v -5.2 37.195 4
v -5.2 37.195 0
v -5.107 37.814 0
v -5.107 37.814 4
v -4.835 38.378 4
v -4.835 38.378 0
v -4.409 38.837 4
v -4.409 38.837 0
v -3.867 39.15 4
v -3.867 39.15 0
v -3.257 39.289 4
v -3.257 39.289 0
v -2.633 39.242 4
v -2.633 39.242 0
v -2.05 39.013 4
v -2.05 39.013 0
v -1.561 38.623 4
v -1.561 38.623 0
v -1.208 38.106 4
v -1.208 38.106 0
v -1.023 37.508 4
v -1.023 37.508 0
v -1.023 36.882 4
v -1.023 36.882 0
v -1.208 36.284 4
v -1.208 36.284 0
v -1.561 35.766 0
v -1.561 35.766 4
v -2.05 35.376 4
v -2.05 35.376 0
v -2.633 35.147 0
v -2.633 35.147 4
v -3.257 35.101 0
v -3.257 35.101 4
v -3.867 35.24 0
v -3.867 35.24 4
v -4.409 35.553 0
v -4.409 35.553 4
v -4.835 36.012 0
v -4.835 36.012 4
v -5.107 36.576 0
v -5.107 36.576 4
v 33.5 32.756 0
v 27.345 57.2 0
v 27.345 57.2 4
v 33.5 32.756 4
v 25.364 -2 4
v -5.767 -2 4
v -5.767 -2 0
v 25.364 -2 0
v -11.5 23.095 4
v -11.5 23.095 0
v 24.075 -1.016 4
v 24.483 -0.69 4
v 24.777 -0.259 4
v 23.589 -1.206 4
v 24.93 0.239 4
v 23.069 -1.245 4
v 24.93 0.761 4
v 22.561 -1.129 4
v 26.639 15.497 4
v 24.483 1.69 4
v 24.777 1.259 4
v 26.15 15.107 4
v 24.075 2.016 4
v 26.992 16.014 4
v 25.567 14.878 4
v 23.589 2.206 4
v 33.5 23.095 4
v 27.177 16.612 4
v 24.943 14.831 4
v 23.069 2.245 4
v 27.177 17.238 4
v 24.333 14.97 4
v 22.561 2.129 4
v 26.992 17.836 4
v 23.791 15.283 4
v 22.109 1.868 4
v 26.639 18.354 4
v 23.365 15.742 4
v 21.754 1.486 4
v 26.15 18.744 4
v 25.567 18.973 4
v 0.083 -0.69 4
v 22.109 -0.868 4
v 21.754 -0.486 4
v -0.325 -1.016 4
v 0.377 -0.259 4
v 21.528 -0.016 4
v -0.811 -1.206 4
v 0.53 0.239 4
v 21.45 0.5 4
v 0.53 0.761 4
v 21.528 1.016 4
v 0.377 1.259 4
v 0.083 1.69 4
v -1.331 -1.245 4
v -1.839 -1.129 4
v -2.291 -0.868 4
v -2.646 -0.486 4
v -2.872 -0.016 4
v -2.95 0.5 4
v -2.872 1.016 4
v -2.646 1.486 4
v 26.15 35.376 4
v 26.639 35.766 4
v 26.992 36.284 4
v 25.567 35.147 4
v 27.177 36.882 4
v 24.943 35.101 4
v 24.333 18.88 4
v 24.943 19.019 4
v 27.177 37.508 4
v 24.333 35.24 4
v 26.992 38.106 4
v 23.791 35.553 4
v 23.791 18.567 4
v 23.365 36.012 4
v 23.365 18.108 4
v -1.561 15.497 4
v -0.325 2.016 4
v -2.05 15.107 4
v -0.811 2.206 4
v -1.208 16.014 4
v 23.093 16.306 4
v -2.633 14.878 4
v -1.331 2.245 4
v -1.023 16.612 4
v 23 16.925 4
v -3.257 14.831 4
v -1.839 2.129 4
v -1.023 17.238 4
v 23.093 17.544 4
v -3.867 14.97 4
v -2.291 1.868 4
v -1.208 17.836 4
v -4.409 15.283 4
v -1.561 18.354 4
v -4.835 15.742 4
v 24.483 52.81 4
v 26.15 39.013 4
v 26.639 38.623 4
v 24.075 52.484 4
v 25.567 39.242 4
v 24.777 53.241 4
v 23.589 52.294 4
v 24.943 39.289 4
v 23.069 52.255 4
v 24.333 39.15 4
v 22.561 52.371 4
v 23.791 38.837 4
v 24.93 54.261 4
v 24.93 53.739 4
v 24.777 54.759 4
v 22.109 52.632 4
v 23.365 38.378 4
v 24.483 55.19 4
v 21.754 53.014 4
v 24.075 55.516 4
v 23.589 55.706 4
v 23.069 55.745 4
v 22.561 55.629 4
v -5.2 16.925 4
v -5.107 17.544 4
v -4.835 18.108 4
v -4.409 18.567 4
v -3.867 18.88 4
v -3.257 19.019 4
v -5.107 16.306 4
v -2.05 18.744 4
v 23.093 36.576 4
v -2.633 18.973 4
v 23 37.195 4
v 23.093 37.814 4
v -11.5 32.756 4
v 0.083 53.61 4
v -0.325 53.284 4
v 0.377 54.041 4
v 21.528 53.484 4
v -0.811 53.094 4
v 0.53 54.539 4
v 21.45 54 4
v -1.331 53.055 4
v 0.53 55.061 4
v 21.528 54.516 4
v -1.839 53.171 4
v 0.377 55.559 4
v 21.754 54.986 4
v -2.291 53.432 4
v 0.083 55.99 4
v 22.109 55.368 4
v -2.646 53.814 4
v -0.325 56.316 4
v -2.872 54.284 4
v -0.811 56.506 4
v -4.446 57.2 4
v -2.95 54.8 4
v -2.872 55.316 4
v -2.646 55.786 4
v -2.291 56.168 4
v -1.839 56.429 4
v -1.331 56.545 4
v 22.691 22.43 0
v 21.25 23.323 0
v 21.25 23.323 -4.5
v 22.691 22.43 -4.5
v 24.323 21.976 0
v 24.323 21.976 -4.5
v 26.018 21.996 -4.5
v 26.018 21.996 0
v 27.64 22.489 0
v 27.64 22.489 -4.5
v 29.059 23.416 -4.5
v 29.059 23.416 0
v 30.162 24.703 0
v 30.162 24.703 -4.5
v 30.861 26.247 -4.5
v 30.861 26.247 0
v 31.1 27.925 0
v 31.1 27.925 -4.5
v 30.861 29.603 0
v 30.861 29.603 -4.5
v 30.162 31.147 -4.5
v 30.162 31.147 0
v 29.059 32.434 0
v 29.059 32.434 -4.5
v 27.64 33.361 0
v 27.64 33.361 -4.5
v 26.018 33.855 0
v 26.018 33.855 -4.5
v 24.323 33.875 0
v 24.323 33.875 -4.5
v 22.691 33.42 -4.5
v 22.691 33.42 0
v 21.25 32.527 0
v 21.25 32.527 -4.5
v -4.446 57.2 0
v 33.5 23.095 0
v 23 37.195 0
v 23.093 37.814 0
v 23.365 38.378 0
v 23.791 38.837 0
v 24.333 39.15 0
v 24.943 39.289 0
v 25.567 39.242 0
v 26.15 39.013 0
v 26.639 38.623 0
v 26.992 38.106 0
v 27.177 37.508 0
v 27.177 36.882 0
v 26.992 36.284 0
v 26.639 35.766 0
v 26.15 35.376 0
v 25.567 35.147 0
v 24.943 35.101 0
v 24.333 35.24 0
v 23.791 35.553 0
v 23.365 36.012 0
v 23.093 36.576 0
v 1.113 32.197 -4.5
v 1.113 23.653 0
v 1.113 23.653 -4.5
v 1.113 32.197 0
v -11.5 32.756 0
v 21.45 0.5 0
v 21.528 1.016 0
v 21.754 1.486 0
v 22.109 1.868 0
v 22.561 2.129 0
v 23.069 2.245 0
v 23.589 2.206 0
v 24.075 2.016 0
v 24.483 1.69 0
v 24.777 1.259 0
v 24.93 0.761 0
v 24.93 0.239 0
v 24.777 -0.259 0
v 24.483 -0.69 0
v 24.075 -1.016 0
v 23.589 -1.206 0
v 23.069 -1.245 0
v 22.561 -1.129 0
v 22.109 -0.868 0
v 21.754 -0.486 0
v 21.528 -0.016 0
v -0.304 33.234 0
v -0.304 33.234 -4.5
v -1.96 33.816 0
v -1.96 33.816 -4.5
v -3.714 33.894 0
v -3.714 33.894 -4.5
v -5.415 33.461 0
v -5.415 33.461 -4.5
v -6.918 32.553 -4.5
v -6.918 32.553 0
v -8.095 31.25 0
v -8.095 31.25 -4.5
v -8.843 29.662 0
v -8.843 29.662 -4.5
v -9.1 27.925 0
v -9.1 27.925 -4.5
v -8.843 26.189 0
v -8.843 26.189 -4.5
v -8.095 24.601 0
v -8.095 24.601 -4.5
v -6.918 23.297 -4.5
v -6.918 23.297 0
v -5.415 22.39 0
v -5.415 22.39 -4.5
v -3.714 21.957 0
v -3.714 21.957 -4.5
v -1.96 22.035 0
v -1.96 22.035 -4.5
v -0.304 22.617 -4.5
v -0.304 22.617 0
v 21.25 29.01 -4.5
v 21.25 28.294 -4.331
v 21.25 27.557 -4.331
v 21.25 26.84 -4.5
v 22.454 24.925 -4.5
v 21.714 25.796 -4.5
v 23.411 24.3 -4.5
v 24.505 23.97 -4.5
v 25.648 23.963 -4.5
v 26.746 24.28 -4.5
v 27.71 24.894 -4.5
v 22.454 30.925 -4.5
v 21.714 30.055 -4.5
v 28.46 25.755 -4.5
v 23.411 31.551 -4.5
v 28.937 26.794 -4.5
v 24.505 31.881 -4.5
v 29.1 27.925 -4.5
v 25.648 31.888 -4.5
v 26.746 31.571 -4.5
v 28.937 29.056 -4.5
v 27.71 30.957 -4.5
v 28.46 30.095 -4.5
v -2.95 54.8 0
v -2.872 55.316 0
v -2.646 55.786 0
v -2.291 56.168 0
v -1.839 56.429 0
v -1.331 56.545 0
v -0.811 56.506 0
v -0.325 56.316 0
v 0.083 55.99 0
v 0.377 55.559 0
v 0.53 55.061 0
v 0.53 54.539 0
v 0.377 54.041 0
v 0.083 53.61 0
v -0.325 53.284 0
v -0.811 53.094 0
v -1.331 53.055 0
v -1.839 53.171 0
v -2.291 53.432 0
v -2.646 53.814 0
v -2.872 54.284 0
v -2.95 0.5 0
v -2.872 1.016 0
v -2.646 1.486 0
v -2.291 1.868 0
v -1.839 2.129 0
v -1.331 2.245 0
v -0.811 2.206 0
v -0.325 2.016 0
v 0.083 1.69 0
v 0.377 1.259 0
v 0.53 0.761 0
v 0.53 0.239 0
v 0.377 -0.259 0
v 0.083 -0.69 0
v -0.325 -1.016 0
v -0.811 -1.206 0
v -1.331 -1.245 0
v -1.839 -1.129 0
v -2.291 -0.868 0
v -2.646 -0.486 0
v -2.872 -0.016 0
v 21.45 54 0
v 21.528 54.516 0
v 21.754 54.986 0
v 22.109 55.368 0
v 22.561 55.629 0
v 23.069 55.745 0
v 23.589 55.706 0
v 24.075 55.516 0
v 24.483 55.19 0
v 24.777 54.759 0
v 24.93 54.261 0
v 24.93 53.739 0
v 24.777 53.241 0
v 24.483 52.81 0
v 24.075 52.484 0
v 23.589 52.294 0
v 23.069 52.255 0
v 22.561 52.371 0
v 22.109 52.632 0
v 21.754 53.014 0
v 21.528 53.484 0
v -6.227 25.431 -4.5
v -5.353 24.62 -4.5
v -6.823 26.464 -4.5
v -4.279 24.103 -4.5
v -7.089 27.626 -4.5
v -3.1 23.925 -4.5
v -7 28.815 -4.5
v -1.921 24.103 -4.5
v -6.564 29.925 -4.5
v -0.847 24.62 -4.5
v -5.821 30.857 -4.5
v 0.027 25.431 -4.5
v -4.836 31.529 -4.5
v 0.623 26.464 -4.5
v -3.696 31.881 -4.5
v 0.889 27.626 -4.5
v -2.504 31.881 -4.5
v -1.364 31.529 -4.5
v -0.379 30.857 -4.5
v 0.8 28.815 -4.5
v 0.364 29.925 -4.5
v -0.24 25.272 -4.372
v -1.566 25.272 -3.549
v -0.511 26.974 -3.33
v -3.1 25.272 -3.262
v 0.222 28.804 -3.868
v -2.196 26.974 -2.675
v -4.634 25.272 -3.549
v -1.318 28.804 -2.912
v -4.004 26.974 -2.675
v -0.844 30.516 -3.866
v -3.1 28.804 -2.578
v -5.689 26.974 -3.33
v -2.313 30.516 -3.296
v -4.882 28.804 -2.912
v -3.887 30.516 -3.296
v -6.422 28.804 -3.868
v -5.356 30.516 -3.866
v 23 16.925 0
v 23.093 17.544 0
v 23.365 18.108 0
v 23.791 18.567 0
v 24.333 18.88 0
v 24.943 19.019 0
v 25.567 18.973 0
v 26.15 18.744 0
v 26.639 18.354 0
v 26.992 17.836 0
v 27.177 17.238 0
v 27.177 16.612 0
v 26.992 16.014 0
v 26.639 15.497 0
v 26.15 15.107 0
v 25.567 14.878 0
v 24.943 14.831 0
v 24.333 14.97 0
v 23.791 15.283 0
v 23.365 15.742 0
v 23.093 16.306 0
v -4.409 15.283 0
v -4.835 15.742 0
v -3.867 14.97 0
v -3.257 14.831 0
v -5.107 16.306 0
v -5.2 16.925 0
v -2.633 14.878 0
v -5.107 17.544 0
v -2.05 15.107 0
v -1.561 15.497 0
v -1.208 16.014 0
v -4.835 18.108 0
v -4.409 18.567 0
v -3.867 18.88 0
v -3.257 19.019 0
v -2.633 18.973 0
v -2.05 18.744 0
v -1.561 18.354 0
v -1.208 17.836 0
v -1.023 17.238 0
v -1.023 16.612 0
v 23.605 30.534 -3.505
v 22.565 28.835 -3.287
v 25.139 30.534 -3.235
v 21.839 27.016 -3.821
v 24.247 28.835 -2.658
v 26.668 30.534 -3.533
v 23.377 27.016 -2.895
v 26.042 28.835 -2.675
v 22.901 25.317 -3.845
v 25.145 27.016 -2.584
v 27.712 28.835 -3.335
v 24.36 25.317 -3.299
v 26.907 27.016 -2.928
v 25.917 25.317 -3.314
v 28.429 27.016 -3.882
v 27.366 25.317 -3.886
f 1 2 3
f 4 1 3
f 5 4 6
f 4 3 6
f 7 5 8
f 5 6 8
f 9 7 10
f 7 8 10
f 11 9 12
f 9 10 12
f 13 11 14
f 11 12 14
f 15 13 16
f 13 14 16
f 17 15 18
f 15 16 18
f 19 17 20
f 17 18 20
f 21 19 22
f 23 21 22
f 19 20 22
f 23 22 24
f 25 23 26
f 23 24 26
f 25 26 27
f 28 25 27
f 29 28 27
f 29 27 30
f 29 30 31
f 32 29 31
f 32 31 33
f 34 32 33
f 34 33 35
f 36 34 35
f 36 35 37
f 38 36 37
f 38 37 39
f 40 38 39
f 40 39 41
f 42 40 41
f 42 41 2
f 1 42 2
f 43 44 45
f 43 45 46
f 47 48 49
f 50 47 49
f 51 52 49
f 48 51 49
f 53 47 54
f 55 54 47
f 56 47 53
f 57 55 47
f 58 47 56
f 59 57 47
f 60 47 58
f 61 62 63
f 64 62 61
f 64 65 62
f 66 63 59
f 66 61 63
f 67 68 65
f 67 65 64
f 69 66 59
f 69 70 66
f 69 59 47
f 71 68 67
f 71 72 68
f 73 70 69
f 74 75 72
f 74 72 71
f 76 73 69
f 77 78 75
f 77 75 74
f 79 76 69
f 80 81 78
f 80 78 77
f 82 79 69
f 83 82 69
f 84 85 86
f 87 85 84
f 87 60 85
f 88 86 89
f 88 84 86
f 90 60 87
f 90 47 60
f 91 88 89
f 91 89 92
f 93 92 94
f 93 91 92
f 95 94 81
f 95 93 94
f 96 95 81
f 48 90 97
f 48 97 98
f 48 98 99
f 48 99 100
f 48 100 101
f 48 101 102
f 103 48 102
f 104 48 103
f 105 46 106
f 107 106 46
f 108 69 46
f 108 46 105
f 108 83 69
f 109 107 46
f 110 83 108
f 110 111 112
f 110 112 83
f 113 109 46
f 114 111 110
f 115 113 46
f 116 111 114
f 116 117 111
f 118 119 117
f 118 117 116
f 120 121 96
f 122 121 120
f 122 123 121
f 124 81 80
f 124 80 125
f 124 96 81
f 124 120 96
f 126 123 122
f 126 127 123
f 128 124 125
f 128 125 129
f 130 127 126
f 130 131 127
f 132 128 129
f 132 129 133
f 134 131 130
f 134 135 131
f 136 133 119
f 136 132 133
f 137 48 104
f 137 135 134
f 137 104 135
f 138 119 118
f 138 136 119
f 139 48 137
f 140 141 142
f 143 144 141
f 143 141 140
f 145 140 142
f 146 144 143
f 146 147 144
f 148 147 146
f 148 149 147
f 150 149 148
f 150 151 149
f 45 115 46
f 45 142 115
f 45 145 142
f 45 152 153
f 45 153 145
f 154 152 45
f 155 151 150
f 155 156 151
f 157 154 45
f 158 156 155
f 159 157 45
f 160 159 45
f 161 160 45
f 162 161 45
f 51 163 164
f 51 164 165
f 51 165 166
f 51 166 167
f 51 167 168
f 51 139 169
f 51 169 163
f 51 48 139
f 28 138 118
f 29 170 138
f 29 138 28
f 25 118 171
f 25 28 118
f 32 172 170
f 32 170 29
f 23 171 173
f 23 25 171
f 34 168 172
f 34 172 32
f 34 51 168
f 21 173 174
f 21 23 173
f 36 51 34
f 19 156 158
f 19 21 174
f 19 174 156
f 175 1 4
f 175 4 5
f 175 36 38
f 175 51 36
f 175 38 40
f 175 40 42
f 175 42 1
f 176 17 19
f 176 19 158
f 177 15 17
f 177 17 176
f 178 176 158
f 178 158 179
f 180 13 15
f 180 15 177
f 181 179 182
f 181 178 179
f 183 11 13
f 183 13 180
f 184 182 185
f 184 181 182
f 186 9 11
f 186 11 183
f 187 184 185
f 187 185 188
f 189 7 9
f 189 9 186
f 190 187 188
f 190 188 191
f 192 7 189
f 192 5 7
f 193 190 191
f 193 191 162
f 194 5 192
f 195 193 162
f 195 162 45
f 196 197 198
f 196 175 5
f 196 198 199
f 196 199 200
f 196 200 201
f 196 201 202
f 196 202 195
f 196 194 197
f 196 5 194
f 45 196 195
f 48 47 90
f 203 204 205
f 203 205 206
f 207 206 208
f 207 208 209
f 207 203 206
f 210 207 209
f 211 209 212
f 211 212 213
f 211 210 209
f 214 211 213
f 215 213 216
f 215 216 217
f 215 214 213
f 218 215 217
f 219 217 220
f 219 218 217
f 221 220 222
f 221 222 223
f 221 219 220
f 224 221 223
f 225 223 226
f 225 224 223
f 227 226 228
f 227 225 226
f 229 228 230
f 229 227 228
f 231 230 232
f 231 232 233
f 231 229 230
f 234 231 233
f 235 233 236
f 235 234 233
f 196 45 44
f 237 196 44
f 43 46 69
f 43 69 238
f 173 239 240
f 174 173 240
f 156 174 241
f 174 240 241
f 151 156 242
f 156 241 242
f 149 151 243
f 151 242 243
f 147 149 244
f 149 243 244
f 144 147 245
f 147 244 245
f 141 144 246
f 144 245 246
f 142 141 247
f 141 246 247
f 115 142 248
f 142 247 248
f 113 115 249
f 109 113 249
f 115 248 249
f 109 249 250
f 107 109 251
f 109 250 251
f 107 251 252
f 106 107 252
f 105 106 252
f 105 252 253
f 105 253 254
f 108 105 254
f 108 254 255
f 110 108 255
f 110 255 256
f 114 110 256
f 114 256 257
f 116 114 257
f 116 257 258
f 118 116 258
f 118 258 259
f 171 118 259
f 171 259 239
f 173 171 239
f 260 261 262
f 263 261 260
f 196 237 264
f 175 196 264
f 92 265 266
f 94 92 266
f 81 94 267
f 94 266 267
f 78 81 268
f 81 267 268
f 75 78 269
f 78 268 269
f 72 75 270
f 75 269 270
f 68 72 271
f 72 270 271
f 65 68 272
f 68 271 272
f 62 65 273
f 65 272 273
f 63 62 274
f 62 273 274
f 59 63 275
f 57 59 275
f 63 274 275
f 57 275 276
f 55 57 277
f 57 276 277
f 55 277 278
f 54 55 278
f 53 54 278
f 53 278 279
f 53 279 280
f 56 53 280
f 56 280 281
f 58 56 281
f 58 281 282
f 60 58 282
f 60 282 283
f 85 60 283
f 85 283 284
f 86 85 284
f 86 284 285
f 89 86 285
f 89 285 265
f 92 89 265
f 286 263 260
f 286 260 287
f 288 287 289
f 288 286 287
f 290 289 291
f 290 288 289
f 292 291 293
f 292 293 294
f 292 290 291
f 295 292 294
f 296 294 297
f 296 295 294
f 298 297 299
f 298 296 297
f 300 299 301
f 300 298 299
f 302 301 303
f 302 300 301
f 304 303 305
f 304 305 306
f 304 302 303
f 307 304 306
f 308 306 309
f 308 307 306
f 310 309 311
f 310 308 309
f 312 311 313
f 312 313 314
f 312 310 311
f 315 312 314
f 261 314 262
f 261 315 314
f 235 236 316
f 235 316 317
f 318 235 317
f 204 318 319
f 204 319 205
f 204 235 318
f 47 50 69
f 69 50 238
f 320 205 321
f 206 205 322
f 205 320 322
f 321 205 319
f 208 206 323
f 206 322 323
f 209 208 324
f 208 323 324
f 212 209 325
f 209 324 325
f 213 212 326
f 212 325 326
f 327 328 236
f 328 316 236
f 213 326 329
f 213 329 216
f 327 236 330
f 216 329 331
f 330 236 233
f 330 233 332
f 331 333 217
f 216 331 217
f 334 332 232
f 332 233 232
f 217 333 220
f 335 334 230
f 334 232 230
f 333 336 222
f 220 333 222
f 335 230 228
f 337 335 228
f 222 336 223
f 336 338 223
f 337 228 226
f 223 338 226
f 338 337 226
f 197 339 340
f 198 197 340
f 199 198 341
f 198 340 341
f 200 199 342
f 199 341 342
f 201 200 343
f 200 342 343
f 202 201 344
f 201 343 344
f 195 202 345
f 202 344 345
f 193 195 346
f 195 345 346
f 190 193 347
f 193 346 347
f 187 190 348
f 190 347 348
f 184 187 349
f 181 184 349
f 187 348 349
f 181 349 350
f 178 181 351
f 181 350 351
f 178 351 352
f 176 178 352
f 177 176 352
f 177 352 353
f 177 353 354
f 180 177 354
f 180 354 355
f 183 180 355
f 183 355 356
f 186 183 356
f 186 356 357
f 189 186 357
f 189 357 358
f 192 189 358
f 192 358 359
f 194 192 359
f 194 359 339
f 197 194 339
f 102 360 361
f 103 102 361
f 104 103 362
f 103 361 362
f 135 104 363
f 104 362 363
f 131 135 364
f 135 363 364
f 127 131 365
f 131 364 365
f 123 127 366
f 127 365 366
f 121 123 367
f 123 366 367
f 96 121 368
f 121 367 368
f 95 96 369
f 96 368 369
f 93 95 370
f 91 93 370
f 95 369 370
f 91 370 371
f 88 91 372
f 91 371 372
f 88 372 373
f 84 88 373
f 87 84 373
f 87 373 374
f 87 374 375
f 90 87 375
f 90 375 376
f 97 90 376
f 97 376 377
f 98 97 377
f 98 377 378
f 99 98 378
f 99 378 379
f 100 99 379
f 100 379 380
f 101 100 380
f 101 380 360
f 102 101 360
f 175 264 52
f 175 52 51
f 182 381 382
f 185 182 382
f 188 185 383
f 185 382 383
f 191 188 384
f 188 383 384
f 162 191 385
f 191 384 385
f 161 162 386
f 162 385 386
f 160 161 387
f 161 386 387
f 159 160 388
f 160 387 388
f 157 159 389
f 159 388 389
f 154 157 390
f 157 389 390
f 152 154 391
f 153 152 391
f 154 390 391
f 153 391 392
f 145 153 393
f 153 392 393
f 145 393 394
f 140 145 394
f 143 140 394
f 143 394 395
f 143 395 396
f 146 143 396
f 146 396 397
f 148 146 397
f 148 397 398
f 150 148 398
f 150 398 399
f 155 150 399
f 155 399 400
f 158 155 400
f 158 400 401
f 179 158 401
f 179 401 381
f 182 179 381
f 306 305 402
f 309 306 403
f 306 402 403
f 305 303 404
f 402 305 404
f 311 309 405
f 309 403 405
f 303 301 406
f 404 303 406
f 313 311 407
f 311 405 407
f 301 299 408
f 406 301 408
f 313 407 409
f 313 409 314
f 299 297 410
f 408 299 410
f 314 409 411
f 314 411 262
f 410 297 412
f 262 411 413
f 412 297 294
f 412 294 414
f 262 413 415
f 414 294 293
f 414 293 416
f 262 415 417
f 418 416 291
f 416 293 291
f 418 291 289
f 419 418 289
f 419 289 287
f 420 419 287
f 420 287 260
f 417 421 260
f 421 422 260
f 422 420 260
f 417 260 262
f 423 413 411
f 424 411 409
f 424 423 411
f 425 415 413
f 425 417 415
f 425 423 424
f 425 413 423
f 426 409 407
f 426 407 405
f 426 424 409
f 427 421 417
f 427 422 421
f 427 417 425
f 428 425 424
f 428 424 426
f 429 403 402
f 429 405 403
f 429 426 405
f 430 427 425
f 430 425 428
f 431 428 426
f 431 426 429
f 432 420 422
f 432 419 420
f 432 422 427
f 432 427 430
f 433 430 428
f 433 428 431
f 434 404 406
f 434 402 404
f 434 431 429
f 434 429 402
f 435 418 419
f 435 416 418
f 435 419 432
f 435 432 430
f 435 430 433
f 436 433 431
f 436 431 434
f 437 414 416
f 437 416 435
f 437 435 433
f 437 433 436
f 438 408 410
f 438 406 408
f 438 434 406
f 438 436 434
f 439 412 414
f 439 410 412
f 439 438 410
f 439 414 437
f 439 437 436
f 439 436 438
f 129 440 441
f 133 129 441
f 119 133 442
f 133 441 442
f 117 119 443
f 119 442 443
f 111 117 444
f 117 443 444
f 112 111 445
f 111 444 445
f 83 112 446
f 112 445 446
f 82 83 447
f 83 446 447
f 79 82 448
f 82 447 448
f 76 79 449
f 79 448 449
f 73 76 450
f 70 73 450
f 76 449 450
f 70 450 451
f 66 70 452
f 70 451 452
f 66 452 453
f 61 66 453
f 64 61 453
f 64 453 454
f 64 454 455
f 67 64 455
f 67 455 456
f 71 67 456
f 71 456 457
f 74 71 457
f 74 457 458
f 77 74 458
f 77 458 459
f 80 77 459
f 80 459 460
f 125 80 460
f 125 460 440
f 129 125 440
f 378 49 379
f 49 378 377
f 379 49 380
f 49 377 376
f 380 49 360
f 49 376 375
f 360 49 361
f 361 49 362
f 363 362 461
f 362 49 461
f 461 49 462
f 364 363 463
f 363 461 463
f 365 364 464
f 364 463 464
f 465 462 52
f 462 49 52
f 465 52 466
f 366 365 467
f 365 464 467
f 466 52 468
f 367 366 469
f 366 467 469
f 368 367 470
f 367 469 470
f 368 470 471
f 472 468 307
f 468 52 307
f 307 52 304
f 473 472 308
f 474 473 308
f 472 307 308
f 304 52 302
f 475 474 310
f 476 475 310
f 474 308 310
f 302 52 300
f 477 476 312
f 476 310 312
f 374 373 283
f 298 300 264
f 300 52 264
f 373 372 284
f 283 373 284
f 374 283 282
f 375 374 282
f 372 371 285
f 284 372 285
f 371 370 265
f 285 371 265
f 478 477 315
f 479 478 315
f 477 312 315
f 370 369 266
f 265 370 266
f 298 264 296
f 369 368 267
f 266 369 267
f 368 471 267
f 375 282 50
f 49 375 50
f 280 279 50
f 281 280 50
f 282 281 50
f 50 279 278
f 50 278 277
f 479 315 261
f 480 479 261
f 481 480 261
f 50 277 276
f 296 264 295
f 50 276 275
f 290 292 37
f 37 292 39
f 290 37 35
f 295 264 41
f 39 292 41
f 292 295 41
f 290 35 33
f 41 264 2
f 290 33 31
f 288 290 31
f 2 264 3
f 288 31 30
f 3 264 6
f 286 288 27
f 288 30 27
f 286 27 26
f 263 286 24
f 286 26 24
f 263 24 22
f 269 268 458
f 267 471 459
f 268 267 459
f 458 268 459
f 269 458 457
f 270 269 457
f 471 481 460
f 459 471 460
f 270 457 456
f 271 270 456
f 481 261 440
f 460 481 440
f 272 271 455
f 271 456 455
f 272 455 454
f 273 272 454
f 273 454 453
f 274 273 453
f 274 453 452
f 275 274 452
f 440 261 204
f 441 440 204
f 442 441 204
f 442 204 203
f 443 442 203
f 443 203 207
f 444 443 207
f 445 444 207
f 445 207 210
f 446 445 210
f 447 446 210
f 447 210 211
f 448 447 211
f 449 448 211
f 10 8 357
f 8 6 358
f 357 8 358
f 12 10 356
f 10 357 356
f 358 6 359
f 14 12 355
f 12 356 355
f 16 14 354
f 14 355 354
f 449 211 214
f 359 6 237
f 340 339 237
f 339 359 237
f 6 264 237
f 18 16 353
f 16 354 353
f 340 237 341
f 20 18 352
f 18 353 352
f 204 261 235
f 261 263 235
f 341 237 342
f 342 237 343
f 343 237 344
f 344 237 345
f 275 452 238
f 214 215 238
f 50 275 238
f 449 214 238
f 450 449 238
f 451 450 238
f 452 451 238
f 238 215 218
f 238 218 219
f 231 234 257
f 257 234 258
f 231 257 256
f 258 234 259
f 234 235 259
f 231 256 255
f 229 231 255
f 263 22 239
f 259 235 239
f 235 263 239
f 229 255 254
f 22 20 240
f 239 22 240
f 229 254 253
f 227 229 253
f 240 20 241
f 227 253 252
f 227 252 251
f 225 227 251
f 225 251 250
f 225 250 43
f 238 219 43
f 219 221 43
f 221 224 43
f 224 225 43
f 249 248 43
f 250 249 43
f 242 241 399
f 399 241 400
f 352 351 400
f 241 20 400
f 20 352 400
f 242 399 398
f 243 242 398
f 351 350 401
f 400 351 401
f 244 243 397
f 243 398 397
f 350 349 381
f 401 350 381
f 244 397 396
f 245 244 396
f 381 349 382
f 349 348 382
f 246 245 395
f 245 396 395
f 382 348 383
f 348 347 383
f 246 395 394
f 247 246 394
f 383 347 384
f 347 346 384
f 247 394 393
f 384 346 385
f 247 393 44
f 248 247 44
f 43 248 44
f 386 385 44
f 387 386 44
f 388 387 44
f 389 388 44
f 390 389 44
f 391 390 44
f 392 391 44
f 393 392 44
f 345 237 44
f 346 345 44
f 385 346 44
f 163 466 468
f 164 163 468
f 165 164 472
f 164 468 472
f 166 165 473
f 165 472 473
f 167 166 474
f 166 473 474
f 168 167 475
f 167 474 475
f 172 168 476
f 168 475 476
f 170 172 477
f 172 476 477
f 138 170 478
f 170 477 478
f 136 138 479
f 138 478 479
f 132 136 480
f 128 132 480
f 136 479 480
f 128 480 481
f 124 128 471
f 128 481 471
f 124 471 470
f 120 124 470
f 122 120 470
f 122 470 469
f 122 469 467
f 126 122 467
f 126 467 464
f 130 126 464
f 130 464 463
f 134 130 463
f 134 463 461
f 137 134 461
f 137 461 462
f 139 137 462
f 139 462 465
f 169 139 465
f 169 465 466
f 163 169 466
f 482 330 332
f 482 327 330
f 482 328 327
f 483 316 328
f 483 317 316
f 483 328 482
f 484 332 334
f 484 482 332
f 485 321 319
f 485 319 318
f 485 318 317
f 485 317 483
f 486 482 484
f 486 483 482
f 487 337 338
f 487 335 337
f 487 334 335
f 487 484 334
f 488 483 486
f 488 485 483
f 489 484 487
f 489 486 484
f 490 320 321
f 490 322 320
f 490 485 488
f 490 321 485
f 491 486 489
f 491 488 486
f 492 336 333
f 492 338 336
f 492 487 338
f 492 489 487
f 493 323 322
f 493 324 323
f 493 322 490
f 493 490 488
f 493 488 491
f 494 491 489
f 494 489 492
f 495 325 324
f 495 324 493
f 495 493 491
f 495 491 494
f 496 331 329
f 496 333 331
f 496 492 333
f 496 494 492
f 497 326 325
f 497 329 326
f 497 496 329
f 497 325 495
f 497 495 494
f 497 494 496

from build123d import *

# Parameters (mm, degrees)
CROQUIS1_W               = 22
CROQUIS1_H               = 55.2
SALIENTE_EXTRUIR1_DEPTH  = 4
CROQUIS2_W               = 12.1
CROQUIS2_H               = 4
CORTAR_EXTRUIR1_DEPTH    = 9.6
CROQUIS3_W               = 12.1
CROQUIS3_H               = 4
CORTAR_EXTRUIR2_DEPTH    = 9.6
CORTAR_EXTRUIR3_DEPTH    = 16
CORTAR_EXTRUIR4_START    = -16
CORTAR_EXTRUIR4_DEPTH    = 16
CROQUIS9_W               = 11.778481694
CROQUIS9_H               = 4
CORTAR_EXTRUIR5_DEPTH    = 2
CROQUIS11_W              = 4.95
CROQUIS11_H              = 4
SALIENTE_EXTRUIR3_DEPTH  = 2
CROQUIS12_W              = 4
CROQUIS12_H              = 1.8
SALIENTE_EXTRUIR4_DEPTH  = 12.1
CROQUIS13_W              = 4.95
CROQUIS13_H              = 4
SALIENTE_EXTRUIR5_DEPTH  = 2
CROQUIS14_W              = 4
CROQUIS14_H              = 1.8
SALIENTE_EXTRUIR6_DEPTH  = 12.1
CROQUIS17_W              = 4
CROQUIS17_H              = 59.2
SALIENTE_EXTRUIR8_DEPTH  = 11.5
CROQUIS18_W              = 4
CROQUIS18_H              = 59.2
SALIENTE_EXTRUIR9_DEPTH  = 11.5
CROQUIS19_R              = 1.75
CORTAR_EXTRUIR6_DEPTH    = 11.5
CORTAR_EXTRUIR7_DEPTH    = 10
CROQUIS27_W              = 12.1
CROQUIS27_H              = 55.6
CORTAR_EXTRUIR8_DEPTH    = 10
CROQUIS28_W              = 12.1
CROQUIS28_H              = 4
SALIENTE_EXTRUIR10_DEPTH = 55.6
SALIENTE_EXTRUIR11_DEPTH = 4.5
CROQUIS30_R              = 2.1
CORTAR_EXTRUIR9_DEPTH    = 10


with BuildPart() as part:
    # Croquis1 → Saliente-Extruir1 (new body)
    with BuildSketch(Plane.XY):
        with Locations((11, 27.6)):
            Rectangle(CROQUIS1_W, CROQUIS1_H)
    extrude(amount=SALIENTE_EXTRUIR1_DEPTH)

    # Croquis2 → Cortar-Extruir1 (cut)
    with BuildSketch(Plane(origin=(0, 55.2, 0), x_dir=(1, 0, 0), z_dir=(0, 1, 0))):
        with Locations((11, -2)):
            Rectangle(CROQUIS2_W, CROQUIS2_H)
    extrude(amount=-CORTAR_EXTRUIR1_DEPTH, mode=Mode.SUBTRACT)

    # Croquis3 → Cortar-Extruir2 (cut)
    with BuildSketch(Plane.XZ):
        with Locations((11, 2)):
            Rectangle(CROQUIS3_W, CROQUIS3_H)
    extrude(amount=-CORTAR_EXTRUIR2_DEPTH, mode=Mode.SUBTRACT)

    # Croquis5 → Cortar-Extruir3 (cut)
    with BuildSketch(Plane.XZ.offset(-9.6)):
        with BuildLine():
            Line((7.4, 4), (14.6, 4))
            ThreePointArc((14.6, 4), (16.401151853, 1.506649462), (17.05, -1.5))
            Line((17.05, -1.5), (4.95, -1.5))
            ThreePointArc((4.95, -1.5), (5.598848147, 1.506649462), (7.4, 4))
        make_face()
    extrude(amount=-CORTAR_EXTRUIR3_DEPTH, mode=Mode.SUBTRACT)

    # Croquis7 → Cortar-Extruir4 (cut)
    with BuildSketch(Plane(origin=(0, 45.6, 0), x_dir=(1, 0, 0), z_dir=(0, 1, 0)).offset(CORTAR_EXTRUIR4_START)):
        with BuildLine():
            Line((4.95, 1.5), (17.05, 1.5))
            ThreePointArc((17.05, 1.5), (16.401151853, -1.506649462), (14.6, -4))
            Line((14.6, -4), (7.4, -4))
            ThreePointArc((7.4, -4), (5.598848147, -1.506649462), (4.95, 1.5))
        make_face()
    extrude(amount=CORTAR_EXTRUIR4_DEPTH, mode=Mode.SUBTRACT)

    # Croquis9 → Cortar-Extruir5 (cut)
    with BuildSketch(Plane(origin=(0, 0, 0), x_dir=(-1, 0, 0), z_dir=(0, 0, -1))):
        with Locations((-11, 27.6)):
            Rectangle(CROQUIS9_W, CROQUIS9_H)
    extrude(amount=-CORTAR_EXTRUIR5_DEPTH, mode=Mode.SUBTRACT)

    # Croquis11 → Saliente-Extruir3 (add)
    with BuildSketch(Plane(origin=(0, 55.2, 0), x_dir=(1, 0, 0), z_dir=(0, 1, 0))):
        with Locations((2.475, -2)):
            Rectangle(CROQUIS11_W, CROQUIS11_H)
        with Locations((19.525, -2)):
            Rectangle(CROQUIS11_W, CROQUIS11_H)
    extrude(amount=SALIENTE_EXTRUIR3_DEPTH)

    # Croquis12 → Saliente-Extruir4 (add)
    with BuildSketch(Plane(origin=(4.95, 0, 0), x_dir=(0, 0, -1), z_dir=(1, 0, 0))):
        with Locations((-2, 56.3)):
            Rectangle(CROQUIS12_W, CROQUIS12_H)
    extrude(amount=SALIENTE_EXTRUIR4_DEPTH)

    # Croquis13 → Saliente-Extruir5 (add)
    with BuildSketch(Plane.XZ):
        with Locations((19.525, 2)):
            Rectangle(CROQUIS13_W, CROQUIS13_H)
        with Locations((2.475, 2)):
            Rectangle(CROQUIS13_W, CROQUIS13_H)
    extrude(amount=SALIENTE_EXTRUIR5_DEPTH)

    # Croquis14 → Saliente-Extruir6 (add)
    with BuildSketch(Plane(origin=(4.95, 0, 0), x_dir=(0, 0, -1), z_dir=(1, 0, 0))):
        with Locations((-2, -1.1)):
            Rectangle(CROQUIS14_W, CROQUIS14_H)
    extrude(amount=SALIENTE_EXTRUIR6_DEPTH)

    # Croquis17 → Saliente-Extruir8 (add)
    with BuildSketch(Plane.ZY):
        with Locations((2, 27.6)):
            Rectangle(CROQUIS17_W, CROQUIS17_H)
    extrude(amount=SALIENTE_EXTRUIR8_DEPTH)

    # Croquis18 → Saliente-Extruir9 (add)
    with BuildSketch(Plane(origin=(22, 0, 0), x_dir=(0, 0, -1), z_dir=(1, 0, 0))):
        with Locations((-2, 27.6)):
            Rectangle(CROQUIS18_W, CROQUIS18_H)
    extrude(amount=SALIENTE_EXTRUIR9_DEPTH)

    # Croquis19 → Cortar-Extruir6 (cut)
    with BuildSketch(Plane(origin=(0, 0, 0), x_dir=(-1, 0, 0), z_dir=(0, 0, -1))):
        with Locations((-23.2, 54)):
            Circle(CROQUIS19_R)
        with Locations((1.2, 54.8)):
            Circle(CROQUIS19_R)
        with Locations((1.2, 0.5)):
            Circle(CROQUIS19_R)
        with Locations((-23.2, 0.5)):
            Circle(CROQUIS19_R)
    extrude(amount=-CORTAR_EXTRUIR6_DEPTH, mode=Mode.SUBTRACT)

    # Croquis21 → Cortar-Extruir7 (cut)
    with BuildSketch(Plane(origin=(0, 0, 0), x_dir=(-1, 0, 0), z_dir=(0, 0, -1))):
        Polygon((-27.345452568, 57.2), (-33.5, 32.755874525), (-33.5, 57.2), align=None)
        Polygon((4.445660904, 57.2), (11.5, 32.755874525), (11.5, 57.2), align=None)
        Polygon((-25.363668871, -2), (-33.5, 23.094679002), (-33.5, -2), align=None)
        Polygon((11.5, 23.094679002), (5.766850036, -2), (11.5, -2), align=None)
    extrude(amount=-CORTAR_EXTRUIR7_DEPTH, mode=Mode.SUBTRACT)

    # Croquis27 → Cortar-Extruir8 (cut)
    with BuildSketch(Plane(origin=(0, 0, 0), x_dir=(-1, 0, 0), z_dir=(0, 0, -1))):
        with Locations((-11, 27.6)):
            Rectangle(CROQUIS27_W, CROQUIS27_H)
    extrude(amount=-CORTAR_EXTRUIR8_DEPTH, mode=Mode.SUBTRACT)

    # Croquis28 → Saliente-Extruir10 (add)
    with BuildSketch(Plane.XZ.offset(-55.4)):
        with Locations((11, 2)):
            Rectangle(CROQUIS28_W, CROQUIS28_H)
    extrude(amount=SALIENTE_EXTRUIR10_DEPTH)

    # Croquis29 → Saliente-Extruir11 (add)
    with BuildSketch(Plane(origin=(0, 0, 0), x_dir=(-1, 0, 0), z_dir=(0, 0, -1))):
        with BuildLine():
            Line((-21.25, 32.527178544), (-21.25, 23.323374983))
            ThreePointArc((-21.25, 23.323374983), (-31.1, 27.925276764), (-21.25, 32.527178544))
        make_face()
        with BuildLine():
            Line((-1.112987938, 23.653189144), (-1.112987938, 32.197364384))
            ThreePointArc((-1.112987938, 32.197364384), (9.1, 27.925276764), (-1.112987938, 23.653189144))
        make_face()
    extrude(amount=SALIENTE_EXTRUIR11_DEPTH)

    # Croquis25 → Cortar-Revolución3 (revolve, cut)
    with BuildSketch(Plane(origin=(0, 0, -7.5), x_dir=(-1, 0, 0), z_dir=(0, 0, -1))):
        with BuildLine():
            Line((-25.1, 22.925276764), (-25.1, 32.925276764))
            ThreePointArc((-25.1, 32.925276764), (-30.1, 27.925276764), (-25.1, 22.925276764))
        make_face()
    revolve(axis=Axis((25.1, 22.925276764, -7.5), (0, 1, 0)), mode=Mode.SUBTRACT)

    # Croquis26 → Cortar-Revolución4 (revolve, cut)
    with BuildSketch(Plane(origin=(0, 0, -7.5), x_dir=(-1, 0, 0), z_dir=(0, 0, -1))):
        with BuildLine():
            Line((3.1, 32.925276764), (3.1, 22.925276764))
            ThreePointArc((3.1, 22.925276764), (8.1, 27.925276764), (3.1, 32.925276764))
        make_face()
    revolve(axis=Axis((-3.1, 32.925276764, -7.5), (0, -1, 0)), mode=Mode.SUBTRACT)

    # Croquis30 → Cortar-Extruir9 (cut)
    with BuildSketch(Plane(origin=(0, 0, 0), x_dir=(-1, 0, 0), z_dir=(0, 0, -1))):
        with Locations((-25.1, 37.194789274)):
            Circle(CROQUIS30_R)
        with Locations((-25.1, 16.925277734)):
            Circle(CROQUIS30_R)
        with Locations((3.1, 37.194789274)):
            Circle(CROQUIS30_R)
        with Locations((3.1, 16.925277734)):
            Circle(CROQUIS30_R)
    extrude(amount=-CORTAR_EXTRUIR9_DEPTH, mode=Mode.SUBTRACT)


solid = part.part
